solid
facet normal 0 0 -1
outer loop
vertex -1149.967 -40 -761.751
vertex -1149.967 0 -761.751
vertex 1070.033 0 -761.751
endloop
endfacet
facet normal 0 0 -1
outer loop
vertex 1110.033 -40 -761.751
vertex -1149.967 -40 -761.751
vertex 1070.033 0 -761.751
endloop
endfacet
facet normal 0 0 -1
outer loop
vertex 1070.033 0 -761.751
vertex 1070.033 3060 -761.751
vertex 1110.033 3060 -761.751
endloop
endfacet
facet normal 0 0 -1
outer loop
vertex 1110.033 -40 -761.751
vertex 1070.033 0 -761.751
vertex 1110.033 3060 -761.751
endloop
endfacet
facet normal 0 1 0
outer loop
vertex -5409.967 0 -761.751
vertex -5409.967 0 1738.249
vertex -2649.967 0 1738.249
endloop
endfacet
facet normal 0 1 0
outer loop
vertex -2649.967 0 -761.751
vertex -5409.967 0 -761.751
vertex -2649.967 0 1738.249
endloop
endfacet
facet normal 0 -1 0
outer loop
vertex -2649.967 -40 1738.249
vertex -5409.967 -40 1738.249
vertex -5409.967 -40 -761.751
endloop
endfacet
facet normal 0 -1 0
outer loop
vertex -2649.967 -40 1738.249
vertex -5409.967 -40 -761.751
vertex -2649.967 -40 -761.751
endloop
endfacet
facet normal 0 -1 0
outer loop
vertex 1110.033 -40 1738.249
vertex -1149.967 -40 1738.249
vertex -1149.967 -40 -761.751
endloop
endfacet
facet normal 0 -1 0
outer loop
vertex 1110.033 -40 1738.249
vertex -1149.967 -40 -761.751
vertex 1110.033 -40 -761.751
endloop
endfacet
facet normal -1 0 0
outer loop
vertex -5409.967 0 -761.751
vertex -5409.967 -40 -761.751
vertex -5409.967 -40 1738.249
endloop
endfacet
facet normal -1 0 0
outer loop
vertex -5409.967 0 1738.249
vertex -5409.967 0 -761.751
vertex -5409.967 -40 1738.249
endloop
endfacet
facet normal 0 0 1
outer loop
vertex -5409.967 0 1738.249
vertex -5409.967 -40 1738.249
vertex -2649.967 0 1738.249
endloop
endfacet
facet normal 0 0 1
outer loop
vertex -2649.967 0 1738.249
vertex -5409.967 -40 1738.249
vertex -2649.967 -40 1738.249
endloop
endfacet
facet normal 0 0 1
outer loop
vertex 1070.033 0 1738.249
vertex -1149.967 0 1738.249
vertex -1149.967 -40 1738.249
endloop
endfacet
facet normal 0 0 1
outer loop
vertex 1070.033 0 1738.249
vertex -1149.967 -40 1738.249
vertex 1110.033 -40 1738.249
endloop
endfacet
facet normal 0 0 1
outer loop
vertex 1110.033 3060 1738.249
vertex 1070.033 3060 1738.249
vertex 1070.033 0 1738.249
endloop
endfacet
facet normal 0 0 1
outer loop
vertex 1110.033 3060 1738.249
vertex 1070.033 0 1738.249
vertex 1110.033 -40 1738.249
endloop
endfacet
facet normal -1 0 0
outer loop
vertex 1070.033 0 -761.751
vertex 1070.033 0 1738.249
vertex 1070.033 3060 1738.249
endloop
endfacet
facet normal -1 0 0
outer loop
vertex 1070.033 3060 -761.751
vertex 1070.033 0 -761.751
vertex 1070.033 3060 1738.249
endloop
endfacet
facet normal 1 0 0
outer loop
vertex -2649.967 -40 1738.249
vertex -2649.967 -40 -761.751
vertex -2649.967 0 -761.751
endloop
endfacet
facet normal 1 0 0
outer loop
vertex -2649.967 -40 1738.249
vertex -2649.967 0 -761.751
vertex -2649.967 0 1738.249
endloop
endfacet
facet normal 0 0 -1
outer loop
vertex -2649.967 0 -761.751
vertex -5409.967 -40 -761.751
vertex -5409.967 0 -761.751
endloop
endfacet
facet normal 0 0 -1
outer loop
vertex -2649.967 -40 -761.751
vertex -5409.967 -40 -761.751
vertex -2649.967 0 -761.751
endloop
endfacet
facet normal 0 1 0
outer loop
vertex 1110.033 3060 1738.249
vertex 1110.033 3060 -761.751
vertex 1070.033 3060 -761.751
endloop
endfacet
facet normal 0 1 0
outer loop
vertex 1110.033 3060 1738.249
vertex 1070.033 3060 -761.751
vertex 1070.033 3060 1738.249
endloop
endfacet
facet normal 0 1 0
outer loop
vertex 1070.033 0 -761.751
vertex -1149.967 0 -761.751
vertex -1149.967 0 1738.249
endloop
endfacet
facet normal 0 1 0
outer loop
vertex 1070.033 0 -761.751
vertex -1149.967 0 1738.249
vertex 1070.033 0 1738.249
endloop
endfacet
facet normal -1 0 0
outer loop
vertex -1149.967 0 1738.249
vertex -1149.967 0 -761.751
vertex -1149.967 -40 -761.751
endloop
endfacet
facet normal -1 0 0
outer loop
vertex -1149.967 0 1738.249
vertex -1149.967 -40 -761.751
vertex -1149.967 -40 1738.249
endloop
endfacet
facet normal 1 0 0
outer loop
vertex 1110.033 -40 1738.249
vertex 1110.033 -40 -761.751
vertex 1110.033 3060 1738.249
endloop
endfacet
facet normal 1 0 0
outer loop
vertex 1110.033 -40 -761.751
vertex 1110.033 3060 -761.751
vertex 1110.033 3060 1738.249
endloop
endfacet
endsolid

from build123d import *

# Parameters (mm, degrees)
F0_W     = 2260
F0_H     = 2500
F1_DEPTH = 40
F2_W     = 40
F2_H     = 2500
F2_W_2   = 3060
F3_DEPTH = 40
F7_W     = 2760
F7_H     = 2500
F8_DEPTH = 40


with BuildPart() as f1:
    # F0 (on Front) → F1 (new body)
    with BuildSketch(Plane.XZ):
        with Locations((-19.967223, 488.248582)):
            Rectangle(F0_W, F0_H)
    extrude(amount=F1_DEPTH)

    # F2 (on face) → F3 (join)
    with BuildSketch(Plane.YZ.offset(1110.032777)):
        with Locations((-20, 488.248582)):
            Rectangle(F2_W, F2_H)
        with Locations((1530, 488.248582)):
            Rectangle(F2_W_2, F2_H)
    extrude(amount=-F3_DEPTH)


with BuildPart() as f8:
    # F7 (on face) → F8 (new body)
    with BuildSketch(Plane.XZ.offset(40)):
        with Locations((-4029.967223, 488.248582)):
            Rectangle(F7_W, F7_H)
    extrude(amount=-F8_DEPTH)


solid = Compound([f1.part, f8.part])
